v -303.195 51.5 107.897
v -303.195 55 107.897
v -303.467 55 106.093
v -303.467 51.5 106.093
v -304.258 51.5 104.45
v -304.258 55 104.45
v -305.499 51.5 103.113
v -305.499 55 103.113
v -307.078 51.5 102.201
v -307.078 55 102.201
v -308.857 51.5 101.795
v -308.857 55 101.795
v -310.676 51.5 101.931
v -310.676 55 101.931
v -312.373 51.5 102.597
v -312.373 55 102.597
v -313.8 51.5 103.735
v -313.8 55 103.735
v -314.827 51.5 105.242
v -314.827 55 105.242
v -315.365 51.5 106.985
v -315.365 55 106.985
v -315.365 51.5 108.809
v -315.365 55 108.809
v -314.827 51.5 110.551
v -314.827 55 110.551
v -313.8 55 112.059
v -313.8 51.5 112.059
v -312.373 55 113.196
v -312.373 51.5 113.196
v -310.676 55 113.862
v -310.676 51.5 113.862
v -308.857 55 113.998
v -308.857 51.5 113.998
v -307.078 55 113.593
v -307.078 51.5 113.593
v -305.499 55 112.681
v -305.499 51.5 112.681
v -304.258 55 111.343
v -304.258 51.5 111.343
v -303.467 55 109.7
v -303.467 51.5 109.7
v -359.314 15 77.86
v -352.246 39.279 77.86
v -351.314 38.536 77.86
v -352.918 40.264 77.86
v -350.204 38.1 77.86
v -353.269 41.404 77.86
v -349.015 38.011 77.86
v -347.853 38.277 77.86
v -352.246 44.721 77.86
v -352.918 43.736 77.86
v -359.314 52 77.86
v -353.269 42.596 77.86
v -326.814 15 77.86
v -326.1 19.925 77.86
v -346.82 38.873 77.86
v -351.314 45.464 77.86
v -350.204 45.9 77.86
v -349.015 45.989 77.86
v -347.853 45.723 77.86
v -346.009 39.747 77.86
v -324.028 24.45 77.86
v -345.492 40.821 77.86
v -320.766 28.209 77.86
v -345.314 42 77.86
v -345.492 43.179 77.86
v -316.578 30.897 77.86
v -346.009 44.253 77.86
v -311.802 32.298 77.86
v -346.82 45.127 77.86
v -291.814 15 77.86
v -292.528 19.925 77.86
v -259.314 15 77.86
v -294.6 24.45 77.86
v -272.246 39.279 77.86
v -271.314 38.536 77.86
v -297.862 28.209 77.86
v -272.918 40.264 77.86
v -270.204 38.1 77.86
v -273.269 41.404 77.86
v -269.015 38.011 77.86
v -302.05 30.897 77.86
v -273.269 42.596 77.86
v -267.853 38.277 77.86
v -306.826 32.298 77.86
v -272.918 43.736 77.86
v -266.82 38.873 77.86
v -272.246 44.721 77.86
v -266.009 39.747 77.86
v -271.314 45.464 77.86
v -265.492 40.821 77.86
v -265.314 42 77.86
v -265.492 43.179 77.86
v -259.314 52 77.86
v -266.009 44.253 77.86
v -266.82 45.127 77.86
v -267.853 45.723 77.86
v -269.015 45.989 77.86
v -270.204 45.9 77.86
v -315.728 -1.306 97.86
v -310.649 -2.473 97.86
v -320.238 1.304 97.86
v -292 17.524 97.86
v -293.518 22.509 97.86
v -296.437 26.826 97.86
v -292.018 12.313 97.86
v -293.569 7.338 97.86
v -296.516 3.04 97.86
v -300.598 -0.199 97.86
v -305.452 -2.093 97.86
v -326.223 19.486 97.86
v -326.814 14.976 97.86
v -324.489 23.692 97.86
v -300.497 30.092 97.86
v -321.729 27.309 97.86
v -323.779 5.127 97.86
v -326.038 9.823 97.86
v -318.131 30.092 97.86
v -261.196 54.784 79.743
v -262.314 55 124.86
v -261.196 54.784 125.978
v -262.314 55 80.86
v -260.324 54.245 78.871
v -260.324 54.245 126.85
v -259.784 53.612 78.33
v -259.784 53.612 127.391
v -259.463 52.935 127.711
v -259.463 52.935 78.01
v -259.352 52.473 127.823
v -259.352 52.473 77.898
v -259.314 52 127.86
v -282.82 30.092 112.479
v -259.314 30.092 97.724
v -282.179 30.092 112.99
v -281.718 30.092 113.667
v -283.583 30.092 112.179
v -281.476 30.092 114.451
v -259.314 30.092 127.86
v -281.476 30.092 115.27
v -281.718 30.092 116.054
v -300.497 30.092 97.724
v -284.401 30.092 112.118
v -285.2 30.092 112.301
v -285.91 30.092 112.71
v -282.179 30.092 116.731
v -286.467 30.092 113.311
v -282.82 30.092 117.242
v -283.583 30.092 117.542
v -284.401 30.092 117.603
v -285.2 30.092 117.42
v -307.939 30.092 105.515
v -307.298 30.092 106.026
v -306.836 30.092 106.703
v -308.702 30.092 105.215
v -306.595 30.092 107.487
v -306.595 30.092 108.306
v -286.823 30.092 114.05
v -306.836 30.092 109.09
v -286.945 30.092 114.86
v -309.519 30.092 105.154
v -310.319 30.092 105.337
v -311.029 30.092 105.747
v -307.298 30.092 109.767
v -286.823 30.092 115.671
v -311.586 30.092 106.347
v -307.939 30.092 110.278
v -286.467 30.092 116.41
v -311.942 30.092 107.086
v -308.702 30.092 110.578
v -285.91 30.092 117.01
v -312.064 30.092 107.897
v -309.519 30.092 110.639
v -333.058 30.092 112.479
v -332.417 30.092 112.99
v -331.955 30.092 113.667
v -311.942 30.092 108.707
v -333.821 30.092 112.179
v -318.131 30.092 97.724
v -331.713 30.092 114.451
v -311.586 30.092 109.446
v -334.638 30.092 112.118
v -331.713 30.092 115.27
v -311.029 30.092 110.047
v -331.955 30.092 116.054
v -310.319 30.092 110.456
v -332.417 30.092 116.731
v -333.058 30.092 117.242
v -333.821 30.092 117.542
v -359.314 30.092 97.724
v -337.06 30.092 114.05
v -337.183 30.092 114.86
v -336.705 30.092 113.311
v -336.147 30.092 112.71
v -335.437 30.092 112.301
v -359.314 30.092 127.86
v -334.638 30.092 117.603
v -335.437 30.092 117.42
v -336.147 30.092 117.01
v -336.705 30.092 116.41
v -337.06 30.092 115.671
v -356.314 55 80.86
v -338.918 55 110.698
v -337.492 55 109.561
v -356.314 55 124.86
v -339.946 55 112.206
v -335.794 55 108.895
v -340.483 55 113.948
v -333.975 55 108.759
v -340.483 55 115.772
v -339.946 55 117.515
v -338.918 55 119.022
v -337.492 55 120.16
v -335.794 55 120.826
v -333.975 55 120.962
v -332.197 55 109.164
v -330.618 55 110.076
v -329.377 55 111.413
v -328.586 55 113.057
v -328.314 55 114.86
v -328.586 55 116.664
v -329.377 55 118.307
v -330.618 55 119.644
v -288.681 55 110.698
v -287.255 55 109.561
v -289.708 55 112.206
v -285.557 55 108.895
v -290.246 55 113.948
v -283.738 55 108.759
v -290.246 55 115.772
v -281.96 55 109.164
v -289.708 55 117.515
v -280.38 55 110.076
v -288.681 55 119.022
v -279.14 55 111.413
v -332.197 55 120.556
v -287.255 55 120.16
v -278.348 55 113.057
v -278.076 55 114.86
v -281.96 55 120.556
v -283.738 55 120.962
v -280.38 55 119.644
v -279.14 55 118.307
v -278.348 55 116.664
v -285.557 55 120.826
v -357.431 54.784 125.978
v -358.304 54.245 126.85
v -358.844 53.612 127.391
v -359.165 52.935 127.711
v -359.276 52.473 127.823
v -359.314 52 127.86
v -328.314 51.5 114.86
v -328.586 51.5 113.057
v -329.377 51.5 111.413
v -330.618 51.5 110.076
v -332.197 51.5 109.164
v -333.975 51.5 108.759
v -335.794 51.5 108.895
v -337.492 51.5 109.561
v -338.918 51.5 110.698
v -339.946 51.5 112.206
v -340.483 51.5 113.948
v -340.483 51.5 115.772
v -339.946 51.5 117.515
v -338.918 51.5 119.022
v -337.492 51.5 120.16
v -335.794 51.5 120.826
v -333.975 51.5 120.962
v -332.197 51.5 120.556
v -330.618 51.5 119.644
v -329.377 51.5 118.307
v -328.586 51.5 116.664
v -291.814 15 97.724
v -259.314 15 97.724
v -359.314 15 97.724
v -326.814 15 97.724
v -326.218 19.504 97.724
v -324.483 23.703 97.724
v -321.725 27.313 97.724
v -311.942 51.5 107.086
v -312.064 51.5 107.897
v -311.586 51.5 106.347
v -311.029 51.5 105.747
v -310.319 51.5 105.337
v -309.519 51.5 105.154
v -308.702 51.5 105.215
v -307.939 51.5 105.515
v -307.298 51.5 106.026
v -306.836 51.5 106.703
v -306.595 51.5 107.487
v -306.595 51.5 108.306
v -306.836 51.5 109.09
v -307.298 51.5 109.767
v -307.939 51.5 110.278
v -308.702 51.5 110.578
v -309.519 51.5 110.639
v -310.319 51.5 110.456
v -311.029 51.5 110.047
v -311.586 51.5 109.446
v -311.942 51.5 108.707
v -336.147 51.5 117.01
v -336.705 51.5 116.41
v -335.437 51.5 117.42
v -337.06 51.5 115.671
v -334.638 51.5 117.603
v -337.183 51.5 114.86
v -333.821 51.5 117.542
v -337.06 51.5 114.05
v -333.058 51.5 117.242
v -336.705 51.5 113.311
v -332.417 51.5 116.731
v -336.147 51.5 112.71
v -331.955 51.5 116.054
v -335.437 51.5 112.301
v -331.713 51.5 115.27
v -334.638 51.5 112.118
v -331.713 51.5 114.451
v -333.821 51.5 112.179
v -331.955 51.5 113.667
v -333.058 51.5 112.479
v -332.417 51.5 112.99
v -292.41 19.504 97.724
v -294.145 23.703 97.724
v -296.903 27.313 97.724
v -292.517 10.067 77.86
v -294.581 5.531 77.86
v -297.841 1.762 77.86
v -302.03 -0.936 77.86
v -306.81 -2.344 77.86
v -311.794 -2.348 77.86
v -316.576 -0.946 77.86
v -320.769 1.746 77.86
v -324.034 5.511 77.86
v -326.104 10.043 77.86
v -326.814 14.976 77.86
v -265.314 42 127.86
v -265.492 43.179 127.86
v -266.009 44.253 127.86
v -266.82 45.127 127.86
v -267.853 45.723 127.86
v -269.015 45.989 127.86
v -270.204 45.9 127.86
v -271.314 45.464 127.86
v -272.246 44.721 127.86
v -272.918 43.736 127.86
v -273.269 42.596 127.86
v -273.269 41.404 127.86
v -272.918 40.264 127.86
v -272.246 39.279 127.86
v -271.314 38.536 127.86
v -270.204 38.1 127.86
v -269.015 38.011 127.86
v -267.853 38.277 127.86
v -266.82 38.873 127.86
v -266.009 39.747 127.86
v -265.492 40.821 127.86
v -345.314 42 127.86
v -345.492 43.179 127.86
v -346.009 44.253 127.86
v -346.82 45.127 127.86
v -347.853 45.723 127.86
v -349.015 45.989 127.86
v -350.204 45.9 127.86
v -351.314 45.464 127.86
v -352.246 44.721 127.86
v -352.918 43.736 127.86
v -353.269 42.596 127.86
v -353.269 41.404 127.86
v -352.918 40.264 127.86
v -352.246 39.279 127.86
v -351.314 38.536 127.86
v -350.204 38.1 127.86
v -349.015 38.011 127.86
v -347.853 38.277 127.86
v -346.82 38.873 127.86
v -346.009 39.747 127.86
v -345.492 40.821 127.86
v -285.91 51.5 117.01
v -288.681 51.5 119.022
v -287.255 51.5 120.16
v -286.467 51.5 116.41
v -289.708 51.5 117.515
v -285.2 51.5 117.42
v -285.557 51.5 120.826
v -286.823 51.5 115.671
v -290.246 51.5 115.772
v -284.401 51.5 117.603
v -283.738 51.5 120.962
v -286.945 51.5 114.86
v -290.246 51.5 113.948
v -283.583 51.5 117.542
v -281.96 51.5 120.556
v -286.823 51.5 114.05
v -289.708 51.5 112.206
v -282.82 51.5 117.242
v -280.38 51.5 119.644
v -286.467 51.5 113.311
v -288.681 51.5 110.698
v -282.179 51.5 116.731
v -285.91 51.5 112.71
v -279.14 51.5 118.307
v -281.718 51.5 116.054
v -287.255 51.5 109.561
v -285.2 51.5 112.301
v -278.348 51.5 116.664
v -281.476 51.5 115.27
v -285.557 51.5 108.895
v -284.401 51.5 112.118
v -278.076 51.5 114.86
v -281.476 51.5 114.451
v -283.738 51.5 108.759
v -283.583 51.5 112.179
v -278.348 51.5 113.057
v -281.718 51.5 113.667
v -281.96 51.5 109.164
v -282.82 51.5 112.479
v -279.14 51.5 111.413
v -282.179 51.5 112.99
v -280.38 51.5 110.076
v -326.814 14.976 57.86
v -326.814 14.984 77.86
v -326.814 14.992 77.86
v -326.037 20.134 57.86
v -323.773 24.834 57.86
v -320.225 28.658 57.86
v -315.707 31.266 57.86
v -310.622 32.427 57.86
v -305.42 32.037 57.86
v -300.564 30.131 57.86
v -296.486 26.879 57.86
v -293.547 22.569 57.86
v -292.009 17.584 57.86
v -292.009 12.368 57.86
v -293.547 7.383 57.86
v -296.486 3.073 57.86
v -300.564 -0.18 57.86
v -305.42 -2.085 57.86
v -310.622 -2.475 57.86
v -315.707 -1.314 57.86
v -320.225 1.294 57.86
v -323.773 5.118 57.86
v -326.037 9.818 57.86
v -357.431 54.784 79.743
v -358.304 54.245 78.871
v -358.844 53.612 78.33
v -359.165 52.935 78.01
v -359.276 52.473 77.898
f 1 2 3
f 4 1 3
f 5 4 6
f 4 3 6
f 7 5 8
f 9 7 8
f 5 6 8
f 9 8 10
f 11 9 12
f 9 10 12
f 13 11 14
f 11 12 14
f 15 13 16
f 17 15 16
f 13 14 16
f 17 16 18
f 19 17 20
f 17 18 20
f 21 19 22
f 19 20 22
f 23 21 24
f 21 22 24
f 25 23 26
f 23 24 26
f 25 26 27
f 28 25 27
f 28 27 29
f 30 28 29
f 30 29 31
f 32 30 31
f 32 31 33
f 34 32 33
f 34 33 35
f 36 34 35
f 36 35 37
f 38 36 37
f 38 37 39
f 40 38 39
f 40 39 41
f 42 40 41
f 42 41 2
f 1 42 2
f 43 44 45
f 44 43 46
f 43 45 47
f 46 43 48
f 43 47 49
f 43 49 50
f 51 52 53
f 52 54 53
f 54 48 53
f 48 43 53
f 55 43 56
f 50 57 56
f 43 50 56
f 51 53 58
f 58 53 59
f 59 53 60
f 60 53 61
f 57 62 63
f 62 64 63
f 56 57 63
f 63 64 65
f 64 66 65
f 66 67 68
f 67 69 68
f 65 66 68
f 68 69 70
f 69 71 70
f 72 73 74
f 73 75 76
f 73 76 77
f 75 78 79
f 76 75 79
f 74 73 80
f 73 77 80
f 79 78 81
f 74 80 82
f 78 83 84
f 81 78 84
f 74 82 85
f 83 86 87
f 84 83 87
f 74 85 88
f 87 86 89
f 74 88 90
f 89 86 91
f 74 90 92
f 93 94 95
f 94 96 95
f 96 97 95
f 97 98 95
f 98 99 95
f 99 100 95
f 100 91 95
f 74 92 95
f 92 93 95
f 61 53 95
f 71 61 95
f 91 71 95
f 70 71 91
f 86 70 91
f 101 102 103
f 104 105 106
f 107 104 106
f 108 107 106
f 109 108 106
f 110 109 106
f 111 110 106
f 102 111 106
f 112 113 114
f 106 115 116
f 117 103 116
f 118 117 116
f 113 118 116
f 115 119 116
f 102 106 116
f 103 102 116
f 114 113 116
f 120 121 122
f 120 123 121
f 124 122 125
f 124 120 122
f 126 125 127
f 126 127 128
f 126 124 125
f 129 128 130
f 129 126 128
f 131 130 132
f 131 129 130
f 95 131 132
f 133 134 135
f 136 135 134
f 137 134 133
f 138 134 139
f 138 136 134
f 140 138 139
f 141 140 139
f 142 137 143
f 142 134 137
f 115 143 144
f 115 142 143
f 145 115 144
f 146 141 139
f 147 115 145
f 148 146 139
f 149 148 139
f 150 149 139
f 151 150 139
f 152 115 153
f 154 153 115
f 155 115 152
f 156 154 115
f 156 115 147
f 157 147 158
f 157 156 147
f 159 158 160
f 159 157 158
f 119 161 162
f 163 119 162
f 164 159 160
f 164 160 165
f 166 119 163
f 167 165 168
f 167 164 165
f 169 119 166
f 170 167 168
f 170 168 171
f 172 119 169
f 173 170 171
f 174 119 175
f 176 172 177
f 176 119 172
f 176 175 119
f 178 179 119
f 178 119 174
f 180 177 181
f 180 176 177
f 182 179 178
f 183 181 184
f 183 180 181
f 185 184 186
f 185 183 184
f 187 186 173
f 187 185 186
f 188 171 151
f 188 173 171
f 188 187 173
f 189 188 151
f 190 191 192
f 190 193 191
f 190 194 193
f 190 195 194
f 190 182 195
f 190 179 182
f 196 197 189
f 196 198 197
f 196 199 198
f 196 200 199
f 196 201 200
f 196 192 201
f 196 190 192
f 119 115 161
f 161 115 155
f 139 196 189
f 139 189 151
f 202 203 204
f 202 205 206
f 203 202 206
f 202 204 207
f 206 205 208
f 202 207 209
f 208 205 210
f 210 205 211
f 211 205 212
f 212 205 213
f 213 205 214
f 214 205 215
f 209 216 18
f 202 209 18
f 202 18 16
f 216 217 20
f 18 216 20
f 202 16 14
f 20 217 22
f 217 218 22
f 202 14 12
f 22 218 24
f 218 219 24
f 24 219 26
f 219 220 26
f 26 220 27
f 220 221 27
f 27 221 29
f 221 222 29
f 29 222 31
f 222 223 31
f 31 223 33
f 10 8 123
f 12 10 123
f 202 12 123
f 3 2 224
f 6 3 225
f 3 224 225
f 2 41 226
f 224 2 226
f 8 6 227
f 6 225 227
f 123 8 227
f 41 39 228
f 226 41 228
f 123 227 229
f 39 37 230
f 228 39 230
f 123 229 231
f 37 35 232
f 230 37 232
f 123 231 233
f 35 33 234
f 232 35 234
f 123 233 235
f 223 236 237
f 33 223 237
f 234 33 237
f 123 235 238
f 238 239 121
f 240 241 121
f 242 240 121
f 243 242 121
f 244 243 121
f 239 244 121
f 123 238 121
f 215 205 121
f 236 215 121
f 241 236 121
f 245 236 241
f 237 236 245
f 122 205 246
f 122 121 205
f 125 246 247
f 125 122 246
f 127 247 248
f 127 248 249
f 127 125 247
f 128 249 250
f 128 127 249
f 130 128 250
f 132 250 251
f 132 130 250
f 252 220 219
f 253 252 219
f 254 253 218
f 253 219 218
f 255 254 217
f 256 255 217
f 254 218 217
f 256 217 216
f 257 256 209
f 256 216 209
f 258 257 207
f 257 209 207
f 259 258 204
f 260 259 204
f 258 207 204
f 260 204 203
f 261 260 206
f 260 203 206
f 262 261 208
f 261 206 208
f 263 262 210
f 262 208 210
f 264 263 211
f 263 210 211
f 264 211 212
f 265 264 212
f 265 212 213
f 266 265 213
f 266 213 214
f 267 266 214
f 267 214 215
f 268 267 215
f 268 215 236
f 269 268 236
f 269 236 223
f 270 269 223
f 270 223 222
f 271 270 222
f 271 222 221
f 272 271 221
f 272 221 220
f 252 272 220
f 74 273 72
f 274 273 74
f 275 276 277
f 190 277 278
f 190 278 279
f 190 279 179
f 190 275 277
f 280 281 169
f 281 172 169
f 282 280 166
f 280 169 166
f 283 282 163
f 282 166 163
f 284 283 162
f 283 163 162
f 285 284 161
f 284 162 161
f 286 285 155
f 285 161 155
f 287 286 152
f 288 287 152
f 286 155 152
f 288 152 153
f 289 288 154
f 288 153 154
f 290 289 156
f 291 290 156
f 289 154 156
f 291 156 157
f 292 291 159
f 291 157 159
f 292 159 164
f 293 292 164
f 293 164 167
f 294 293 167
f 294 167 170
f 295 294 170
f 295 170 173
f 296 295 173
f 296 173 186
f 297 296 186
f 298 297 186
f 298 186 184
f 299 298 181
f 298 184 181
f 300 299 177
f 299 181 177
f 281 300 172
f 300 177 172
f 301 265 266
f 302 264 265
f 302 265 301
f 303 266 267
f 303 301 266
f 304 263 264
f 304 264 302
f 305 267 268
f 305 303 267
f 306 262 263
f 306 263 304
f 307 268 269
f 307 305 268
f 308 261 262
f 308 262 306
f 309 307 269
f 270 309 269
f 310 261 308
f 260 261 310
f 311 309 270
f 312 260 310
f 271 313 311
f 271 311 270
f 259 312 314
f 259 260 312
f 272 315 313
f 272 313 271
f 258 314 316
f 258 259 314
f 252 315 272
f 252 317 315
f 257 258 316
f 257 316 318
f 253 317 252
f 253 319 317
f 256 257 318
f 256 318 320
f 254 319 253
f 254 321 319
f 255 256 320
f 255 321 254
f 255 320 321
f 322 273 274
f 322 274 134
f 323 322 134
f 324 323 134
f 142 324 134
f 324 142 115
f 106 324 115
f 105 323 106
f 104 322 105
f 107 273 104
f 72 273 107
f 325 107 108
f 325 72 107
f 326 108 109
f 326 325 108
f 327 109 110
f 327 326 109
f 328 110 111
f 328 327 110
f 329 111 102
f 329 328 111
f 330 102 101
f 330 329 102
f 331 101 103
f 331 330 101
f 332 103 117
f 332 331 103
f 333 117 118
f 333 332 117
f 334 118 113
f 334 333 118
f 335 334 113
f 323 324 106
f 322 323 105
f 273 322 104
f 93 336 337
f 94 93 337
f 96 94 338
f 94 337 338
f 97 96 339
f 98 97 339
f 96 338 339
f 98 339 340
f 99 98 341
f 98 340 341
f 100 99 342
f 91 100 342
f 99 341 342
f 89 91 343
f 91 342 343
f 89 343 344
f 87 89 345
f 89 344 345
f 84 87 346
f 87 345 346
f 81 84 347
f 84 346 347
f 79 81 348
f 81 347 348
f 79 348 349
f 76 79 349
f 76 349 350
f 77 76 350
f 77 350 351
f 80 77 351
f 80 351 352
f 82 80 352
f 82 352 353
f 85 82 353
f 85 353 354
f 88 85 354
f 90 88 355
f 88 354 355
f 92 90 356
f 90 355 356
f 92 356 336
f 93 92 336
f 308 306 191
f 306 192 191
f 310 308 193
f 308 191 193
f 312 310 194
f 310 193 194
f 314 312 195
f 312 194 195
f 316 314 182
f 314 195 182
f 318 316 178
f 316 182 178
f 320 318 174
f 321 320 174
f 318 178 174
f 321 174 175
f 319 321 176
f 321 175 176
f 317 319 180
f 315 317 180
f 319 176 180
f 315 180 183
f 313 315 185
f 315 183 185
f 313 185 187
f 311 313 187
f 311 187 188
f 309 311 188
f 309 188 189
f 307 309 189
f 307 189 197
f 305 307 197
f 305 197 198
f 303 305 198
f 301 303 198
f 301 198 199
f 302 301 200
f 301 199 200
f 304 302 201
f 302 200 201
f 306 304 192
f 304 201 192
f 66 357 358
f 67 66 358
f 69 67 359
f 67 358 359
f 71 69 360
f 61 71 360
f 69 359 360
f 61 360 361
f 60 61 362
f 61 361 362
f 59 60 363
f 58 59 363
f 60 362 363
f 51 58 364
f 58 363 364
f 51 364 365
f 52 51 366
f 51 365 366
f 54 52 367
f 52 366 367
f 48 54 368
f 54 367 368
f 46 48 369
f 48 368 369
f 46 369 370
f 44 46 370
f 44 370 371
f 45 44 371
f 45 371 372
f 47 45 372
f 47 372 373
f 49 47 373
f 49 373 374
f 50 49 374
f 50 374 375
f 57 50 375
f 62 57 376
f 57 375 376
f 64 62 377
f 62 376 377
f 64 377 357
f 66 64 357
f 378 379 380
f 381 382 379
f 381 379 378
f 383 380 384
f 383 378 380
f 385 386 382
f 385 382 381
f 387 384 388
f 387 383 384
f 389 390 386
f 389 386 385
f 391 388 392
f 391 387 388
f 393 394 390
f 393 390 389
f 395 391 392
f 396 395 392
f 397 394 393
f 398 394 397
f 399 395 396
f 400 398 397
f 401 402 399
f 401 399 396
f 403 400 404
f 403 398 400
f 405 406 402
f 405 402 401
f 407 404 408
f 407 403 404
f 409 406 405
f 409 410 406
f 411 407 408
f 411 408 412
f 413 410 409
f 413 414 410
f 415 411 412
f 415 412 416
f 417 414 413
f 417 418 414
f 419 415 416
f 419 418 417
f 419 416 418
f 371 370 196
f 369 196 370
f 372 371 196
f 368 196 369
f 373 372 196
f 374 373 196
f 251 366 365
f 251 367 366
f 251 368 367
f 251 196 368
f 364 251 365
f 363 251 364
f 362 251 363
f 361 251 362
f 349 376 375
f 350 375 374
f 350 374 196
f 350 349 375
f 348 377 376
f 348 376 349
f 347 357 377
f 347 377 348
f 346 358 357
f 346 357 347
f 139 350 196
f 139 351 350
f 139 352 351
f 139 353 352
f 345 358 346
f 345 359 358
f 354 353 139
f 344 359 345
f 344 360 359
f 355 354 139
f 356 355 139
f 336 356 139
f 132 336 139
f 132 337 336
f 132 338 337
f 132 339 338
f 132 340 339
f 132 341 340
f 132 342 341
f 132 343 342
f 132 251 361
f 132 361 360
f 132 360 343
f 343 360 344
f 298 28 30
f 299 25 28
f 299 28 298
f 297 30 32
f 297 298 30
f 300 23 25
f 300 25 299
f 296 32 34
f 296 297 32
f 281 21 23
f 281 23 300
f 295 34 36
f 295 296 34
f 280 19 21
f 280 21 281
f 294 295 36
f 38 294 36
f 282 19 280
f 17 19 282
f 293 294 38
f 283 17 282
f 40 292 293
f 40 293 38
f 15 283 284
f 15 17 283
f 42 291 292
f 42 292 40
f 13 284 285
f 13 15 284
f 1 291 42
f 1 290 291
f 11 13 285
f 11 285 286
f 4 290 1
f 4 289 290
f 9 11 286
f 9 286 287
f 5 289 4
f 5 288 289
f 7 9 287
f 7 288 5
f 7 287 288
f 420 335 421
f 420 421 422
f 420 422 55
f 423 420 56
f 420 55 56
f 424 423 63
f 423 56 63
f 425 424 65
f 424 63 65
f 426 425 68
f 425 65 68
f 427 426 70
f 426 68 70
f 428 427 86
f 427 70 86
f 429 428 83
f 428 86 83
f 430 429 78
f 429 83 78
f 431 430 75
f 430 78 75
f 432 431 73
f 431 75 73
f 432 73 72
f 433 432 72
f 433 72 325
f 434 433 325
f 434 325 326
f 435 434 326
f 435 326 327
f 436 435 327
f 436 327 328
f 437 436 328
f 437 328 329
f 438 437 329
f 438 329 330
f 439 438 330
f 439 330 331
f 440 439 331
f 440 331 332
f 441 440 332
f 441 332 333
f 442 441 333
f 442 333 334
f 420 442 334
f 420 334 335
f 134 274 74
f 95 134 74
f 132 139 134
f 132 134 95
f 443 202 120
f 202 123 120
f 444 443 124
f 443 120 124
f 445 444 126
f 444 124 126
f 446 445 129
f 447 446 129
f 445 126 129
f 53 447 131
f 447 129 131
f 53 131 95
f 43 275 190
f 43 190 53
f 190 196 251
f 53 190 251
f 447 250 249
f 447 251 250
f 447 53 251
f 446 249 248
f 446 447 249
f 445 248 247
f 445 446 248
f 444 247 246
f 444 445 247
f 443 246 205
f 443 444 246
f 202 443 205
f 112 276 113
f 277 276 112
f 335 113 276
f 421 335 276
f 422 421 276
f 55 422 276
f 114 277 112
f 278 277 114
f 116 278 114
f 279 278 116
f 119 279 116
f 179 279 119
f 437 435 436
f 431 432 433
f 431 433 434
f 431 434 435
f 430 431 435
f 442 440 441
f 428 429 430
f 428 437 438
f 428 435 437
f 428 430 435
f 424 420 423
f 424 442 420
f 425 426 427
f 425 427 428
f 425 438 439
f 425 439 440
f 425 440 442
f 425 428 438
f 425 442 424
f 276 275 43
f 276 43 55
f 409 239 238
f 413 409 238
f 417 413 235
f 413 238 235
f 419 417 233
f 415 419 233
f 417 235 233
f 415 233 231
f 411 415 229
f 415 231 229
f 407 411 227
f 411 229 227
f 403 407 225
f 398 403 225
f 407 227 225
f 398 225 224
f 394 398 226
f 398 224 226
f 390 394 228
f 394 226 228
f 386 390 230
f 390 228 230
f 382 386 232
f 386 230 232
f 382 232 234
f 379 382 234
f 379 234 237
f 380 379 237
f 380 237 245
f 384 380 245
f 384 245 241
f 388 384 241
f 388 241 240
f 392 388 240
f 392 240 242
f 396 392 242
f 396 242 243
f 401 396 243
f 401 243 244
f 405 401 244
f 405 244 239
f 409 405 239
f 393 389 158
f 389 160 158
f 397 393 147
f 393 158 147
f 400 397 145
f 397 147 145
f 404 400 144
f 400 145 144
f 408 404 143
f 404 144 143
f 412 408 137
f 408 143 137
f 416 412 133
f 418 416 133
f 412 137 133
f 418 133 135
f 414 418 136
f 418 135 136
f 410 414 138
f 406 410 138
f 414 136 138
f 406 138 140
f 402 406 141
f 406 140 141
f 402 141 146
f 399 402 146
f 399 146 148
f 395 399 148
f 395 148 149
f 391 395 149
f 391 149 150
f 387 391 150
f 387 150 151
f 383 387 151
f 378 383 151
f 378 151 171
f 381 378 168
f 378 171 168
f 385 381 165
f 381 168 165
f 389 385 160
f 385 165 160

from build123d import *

# Parameters (mm, degrees)
ESBO_O1_W                                            = 100
ESBO_O1_H                                            = 40
ESBO_O1_R                                            = 4
RESSALTO_EXTRUS_O1_DEPTH                             = 50
FILETE1_R                                            = 3
ESBO_O3_W                                            = 30.13686718
ESBO_O3_H                                            = 15.092425978
CORTE_EXTRUS_O1_DEPTH                                = 1
CORTE_EXTRUS_O1_DEPTH_BACK                           = 101
ESBO_O4_R                                            = 17.5
RESSALTO_EXTRUS_O2_DEPTH                             = 20
RESSALTO_EXTRUS_O2_DEPTH_BACK                        = 20
REBAIXO_PARA_PARAFUSO_DE_CABE_A_SEXTAVAD_D           = 5.5
REBAIXO_PARA_PARAFUSO_DE_CABE_A_SEXTAVAD_CBORE_D     = 12.238
REBAIXO_PARA_PARAFUSO_DE_CABE_A_SEXTAVAD_CBORE_DEPTH = 3.5


with BuildPart() as part:
    # Esboço1 → Ressalto-extrusão1 (new body)
    with BuildSketch(Plane.XY.offset(127.860451464)):
        with Locations((-309.31398478, 35)):
            Rectangle(ESBO_O1_W, ESBO_O1_H)
        with Locations((-349.31398478, 42)):
            Circle(ESBO_O1_R, mode=Mode.SUBTRACT)
        with Locations((-269.31398478, 42)):
            Circle(ESBO_O1_R, mode=Mode.SUBTRACT)
    extrude(amount=-RESSALTO_EXTRUS_O1_DEPTH)

    # Filete1
    filete1_edges = [part.edges().sort_by_distance(p)[0] for p in [
        (-309.31398478, 55, 77.860451464),
        (-309.31398478, 55, 127.860451464),
        (-359.31398478, 55, 102.860451464),
        (-259.31398478, 55, 102.860451464),
    ]]
    fillet(filete1_edges, radius=FILETE1_R)

    # Esboço3 → Corte-extrusão1 (cut, two sides)
    with BuildSketch(Plane.ZY.offset(359.31398478)) as corte_extrus_o1_sk:
        with Locations((112.792017874, 22.546212989)):
            Rectangle(ESBO_O3_W, ESBO_O3_H)
    extrude(amount=CORTE_EXTRUS_O1_DEPTH, mode=Mode.SUBTRACT)
    extrude(corte_extrus_o1_sk.sketch, amount=-CORTE_EXTRUS_O1_DEPTH_BACK, mode=Mode.SUBTRACT)

    # Esboço4 → Ressalto-extrusão2 (add, two sides)
    with BuildSketch(Plane(origin=(0, 0, 77.860451464), x_dir=(-1, 0, 0), z_dir=(0, 0, -1))) as ressalto_extrus_o2_sk:
        with Locations((309.31398478, 14.975825016)):
            Circle(ESBO_O4_R)
    extrude(amount=RESSALTO_EXTRUS_O2_DEPTH)
    extrude(ressalto_extrus_o2_sk.sketch, amount=-RESSALTO_EXTRUS_O2_DEPTH_BACK)

    # Rebaixo para parafuso de cabeça sextavada de M51 (through all)
    with Locations(Plane(origin=(0, 55, 0), x_dir=(1, 0, 0), z_dir=(0, 1, 0))):
        with Locations((-284.195309224, -114.860451464), (-334.432660336, -114.860451464), (-309.31398478, -107.896538756)):
            CounterBoreHole(REBAIXO_PARA_PARAFUSO_DE_CABE_A_SEXTAVAD_D / 2, REBAIXO_PARA_PARAFUSO_DE_CABE_A_SEXTAVAD_CBORE_D / 2, REBAIXO_PARA_PARAFUSO_DE_CABE_A_SEXTAVAD_CBORE_DEPTH)


solid = part.part
